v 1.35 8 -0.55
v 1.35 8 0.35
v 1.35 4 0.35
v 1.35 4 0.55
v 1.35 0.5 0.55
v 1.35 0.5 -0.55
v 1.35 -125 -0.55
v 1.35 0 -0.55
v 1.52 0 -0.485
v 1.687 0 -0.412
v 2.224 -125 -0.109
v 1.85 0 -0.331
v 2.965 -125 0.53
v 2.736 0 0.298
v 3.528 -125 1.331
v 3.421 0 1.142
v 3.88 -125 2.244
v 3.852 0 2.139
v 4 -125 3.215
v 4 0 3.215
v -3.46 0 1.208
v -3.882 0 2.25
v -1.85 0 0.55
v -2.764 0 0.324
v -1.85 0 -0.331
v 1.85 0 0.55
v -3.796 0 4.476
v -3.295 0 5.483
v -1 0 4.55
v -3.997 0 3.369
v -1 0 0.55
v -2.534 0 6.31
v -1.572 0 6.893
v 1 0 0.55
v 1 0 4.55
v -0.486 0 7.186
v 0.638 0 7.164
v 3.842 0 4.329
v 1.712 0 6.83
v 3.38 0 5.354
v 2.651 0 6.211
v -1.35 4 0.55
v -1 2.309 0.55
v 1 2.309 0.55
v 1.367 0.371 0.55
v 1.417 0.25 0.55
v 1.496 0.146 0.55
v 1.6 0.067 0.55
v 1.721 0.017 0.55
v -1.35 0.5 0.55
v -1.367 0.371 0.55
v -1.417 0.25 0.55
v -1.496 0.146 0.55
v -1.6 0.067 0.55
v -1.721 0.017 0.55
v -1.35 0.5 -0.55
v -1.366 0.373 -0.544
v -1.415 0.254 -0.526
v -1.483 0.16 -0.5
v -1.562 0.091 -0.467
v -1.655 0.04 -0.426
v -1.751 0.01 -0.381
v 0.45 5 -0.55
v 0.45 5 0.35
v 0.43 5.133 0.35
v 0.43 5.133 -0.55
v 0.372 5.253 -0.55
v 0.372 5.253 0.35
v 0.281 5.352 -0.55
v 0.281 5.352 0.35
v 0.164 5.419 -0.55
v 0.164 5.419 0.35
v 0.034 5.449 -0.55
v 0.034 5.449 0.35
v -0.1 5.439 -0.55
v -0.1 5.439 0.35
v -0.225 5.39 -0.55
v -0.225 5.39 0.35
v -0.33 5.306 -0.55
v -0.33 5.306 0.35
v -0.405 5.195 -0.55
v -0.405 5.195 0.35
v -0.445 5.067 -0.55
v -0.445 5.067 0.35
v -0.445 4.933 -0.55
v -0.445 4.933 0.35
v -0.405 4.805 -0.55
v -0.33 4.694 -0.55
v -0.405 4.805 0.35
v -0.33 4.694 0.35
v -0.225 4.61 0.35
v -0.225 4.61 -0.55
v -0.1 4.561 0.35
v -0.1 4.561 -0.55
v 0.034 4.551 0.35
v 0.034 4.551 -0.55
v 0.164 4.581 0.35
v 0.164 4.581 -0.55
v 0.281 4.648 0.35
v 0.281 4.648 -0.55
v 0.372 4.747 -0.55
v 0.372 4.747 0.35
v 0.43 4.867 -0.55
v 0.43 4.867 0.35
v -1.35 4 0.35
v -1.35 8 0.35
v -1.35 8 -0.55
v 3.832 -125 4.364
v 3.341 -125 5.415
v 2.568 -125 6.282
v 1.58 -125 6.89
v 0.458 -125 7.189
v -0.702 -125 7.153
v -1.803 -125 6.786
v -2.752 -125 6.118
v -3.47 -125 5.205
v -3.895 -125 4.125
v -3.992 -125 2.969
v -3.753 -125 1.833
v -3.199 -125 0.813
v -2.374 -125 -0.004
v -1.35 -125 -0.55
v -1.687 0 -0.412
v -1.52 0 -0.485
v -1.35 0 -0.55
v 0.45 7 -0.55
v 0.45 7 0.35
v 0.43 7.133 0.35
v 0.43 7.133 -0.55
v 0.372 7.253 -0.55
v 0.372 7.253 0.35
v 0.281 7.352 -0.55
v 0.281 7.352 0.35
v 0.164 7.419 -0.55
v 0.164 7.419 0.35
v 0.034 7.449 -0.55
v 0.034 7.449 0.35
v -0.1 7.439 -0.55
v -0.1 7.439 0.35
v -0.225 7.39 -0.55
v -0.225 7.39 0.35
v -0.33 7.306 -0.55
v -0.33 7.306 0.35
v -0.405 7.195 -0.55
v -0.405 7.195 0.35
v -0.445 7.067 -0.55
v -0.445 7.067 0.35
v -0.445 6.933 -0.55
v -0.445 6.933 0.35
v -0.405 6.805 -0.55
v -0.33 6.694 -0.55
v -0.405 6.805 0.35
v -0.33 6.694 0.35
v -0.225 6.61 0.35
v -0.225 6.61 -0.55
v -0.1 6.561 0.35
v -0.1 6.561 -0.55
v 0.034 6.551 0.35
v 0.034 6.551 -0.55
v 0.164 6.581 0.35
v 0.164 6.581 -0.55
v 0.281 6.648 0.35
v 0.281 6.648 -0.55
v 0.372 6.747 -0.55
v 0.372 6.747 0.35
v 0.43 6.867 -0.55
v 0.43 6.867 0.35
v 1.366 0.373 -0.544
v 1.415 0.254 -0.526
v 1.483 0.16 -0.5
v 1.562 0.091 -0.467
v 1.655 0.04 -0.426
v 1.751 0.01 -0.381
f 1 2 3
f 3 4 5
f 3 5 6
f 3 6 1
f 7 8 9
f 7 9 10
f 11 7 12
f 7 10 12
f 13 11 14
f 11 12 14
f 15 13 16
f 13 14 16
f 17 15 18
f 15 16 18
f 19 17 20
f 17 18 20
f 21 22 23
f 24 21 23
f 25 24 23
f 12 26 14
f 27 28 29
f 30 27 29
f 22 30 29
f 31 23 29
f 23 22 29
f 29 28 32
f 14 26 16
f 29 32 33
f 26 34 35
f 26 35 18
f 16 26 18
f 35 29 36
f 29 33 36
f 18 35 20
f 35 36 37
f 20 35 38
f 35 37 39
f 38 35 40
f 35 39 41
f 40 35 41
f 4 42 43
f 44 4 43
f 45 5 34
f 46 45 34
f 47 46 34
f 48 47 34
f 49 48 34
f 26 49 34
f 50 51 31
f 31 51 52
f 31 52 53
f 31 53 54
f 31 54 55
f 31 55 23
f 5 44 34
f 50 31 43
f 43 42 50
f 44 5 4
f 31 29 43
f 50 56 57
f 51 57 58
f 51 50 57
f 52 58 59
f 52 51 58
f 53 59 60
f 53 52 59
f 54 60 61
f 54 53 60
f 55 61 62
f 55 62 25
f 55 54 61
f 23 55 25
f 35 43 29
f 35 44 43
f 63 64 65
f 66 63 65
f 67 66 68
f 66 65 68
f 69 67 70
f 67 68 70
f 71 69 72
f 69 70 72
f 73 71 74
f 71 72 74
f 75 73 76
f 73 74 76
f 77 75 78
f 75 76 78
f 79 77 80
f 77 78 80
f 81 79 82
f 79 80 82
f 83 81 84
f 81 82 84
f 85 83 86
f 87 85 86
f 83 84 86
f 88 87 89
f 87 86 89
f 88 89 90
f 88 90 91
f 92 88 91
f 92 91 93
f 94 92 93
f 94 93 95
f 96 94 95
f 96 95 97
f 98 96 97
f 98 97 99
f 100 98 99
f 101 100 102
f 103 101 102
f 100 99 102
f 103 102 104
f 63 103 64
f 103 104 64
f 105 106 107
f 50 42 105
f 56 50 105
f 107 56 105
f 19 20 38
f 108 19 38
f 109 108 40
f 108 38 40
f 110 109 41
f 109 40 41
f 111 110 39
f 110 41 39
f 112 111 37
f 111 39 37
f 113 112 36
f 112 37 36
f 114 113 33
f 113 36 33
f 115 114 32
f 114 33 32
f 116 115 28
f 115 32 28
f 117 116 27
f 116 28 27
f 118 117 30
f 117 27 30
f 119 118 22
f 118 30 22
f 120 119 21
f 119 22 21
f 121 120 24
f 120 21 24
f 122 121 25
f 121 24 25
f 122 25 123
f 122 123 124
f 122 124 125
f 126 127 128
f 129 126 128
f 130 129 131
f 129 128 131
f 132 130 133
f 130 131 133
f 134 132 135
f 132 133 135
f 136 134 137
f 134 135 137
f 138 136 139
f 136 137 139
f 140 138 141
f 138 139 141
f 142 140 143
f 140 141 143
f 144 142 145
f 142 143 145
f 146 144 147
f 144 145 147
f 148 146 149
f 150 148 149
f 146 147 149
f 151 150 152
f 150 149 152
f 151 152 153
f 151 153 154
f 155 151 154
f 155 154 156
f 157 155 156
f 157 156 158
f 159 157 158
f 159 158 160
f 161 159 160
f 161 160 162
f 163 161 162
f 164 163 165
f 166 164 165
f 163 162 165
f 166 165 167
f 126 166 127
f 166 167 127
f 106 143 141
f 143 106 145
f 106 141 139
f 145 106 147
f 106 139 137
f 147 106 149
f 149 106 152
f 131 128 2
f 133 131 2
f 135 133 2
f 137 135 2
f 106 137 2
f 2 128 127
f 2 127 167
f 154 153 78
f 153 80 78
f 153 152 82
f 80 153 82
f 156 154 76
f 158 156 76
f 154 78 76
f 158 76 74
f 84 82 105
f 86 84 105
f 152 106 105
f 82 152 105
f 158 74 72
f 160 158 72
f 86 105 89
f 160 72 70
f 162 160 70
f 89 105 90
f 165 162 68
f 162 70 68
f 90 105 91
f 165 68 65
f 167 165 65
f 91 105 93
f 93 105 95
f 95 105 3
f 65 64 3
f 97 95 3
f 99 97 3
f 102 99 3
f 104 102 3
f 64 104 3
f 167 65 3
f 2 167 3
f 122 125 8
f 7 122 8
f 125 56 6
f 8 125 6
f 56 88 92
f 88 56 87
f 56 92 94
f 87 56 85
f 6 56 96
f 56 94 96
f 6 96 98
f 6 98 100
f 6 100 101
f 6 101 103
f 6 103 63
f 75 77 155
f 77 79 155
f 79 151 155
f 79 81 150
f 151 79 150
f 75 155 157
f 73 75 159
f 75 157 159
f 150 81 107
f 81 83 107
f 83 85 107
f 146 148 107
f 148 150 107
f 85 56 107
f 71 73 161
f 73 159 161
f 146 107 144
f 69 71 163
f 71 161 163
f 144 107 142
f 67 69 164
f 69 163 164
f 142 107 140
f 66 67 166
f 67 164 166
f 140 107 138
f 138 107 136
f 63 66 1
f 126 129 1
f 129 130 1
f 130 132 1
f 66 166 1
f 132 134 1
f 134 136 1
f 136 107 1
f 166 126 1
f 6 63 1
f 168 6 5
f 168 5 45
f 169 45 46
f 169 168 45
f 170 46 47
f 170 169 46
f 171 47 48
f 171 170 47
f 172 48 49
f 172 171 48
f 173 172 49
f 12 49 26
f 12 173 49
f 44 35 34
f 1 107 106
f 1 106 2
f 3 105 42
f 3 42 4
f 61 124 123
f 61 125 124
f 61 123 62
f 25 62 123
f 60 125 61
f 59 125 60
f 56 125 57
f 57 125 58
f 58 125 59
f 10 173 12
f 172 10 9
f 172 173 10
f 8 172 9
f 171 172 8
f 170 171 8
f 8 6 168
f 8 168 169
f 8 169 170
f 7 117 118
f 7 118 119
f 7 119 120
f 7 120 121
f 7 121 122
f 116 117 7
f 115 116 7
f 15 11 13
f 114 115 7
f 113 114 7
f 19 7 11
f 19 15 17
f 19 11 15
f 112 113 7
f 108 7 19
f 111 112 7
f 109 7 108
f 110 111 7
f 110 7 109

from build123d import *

# Parameters (mm, degrees)
SKETCH1_W              = 2.7
SKETCH1_H              = 1.1
BOSS_EXTRUDE1_DEPTH    = 4
SKETCH2_W              = 2.7
SKETCH2_H              = 0.9
BOSS_EXTRUDE2_DEPTH    = 4
SKETCH3_W              = 2.7
SKETCH3_H              = 1.1
LENGHT_EXTRUSION_DEPTH = 125
BOSS_EXTRUDE4_DEPTH    = 1
FILLET8_R              = 0.5
SKETCH7_R              = 0.45
CUT_EXTRUDE1_DEPTH     = 0.9


with BuildPart() as part:
    # Sketch1 → Boss-Extrude1 (new body)
    with BuildSketch(Plane(origin=(0, 0, 0), x_dir=(1, 0, 0), z_dir=(0, 1, 0))):
        Rectangle(SKETCH1_W, SKETCH1_H)
    extrude(amount=BOSS_EXTRUDE1_DEPTH)

    # Sketch2 → Boss-Extrude2 (add)
    with BuildSketch(Plane(origin=(0, 4, 0), x_dir=(1, 0, 0), z_dir=(0, 1, 0))):
        with Locations((0, 0.1)):
            Rectangle(SKETCH2_W, SKETCH2_H)
    extrude(amount=BOSS_EXTRUDE2_DEPTH)

    # Sketch3 → lenght extrusion (add)
    with BuildSketch(Plane.XZ):
        with BuildLine():
            ThreePointArc((4, 3.215302113), (-2.302172887, 6.486387559), (-1.35, -0.55))
            Line((-1.35, -0.55), (-1.35, 0.55))
            Line((-1.35, 0.55), (1.35, 0.55))
            Line((1.35, 0.55), (1.35, -0.55))
            ThreePointArc((1.35, -0.55), (3.271085447, 0.913129226), (4, 3.215302113))
        make_face()
        Rectangle(SKETCH3_W, SKETCH3_H)
    extrude(amount=LENGHT_EXTRUSION_DEPTH)

    # Sketch6 → Boss-Extrude4 (add, symmetric)
    with BuildSketch(Plane(origin=(0, 0, 0), x_dir=(0, 0, -1), z_dir=(1, 0, 0))):
        Polygon((-0.55, 2.309401077), (-4.55, 0), (-0.55, 0), align=None)
    extrude(amount=BOSS_EXTRUDE4_DEPTH, both=True)

    # Fillet8
    # the kernel refuses this fillet: 0.5 mm, written as the material it adds along each edge
    with BuildSketch(Plane(origin=(-1.35, 0, 0.55), x_dir=(0, 1, 0), z_dir=(0, 0, -1))) as fillet8_piece_1_section:
        with BuildLine():
            CenterArc((FILLET8_R, -FILLET8_R), FILLET8_R, 90, 90)
            Line((0, -FILLET8_R), (0, 0))
            Line((0, 0), (FILLET8_R, 0))
        make_face()
    fillet8_piece_1 = extrude(amount=1.1, mode=Mode.PRIVATE)
    fillet8_piece_1 = fillet8_piece_1 & Plane(origin=(0, 0.115807934, 3.215302113), x_dir=(1, 0, 0), z_dir=(0, 1, 0)) * Cylinder(4, 5, mode=Mode.PRIVATE)
    add(fillet8_piece_1)
    with BuildSketch(Plane(origin=(1.35, 0, -0.55), x_dir=(0, 1, 0), z_dir=(0, 0, 1))) as fillet8_piece_2_section:
        with BuildLine():
            CenterArc((FILLET8_R, -FILLET8_R), FILLET8_R, 90, 90)
            Line((0, -FILLET8_R), (0, 0))
            Line((0, 0), (FILLET8_R, 0))
        make_face()
    fillet8_piece_2 = extrude(amount=1.1, mode=Mode.PRIVATE)
    fillet8_piece_2 = fillet8_piece_2 & Plane(origin=(0, 0.11580798, 3.215302113), x_dir=(1, 0, 0), z_dir=(0, 1, 0)) * Cylinder(4, 5, mode=Mode.PRIVATE)
    add(fillet8_piece_2)

    # Sketch7 → Cut-Extrude1 (cut)
    with BuildSketch(Plane.XY.offset(0.35)):
        with Locations((0, 5)):
            Circle(SKETCH7_R)
        with Locations((0, 7)):
            Circle(SKETCH7_R)
    extrude(amount=-CUT_EXTRUDE1_DEPTH, mode=Mode.SUBTRACT)


solid = part.part
